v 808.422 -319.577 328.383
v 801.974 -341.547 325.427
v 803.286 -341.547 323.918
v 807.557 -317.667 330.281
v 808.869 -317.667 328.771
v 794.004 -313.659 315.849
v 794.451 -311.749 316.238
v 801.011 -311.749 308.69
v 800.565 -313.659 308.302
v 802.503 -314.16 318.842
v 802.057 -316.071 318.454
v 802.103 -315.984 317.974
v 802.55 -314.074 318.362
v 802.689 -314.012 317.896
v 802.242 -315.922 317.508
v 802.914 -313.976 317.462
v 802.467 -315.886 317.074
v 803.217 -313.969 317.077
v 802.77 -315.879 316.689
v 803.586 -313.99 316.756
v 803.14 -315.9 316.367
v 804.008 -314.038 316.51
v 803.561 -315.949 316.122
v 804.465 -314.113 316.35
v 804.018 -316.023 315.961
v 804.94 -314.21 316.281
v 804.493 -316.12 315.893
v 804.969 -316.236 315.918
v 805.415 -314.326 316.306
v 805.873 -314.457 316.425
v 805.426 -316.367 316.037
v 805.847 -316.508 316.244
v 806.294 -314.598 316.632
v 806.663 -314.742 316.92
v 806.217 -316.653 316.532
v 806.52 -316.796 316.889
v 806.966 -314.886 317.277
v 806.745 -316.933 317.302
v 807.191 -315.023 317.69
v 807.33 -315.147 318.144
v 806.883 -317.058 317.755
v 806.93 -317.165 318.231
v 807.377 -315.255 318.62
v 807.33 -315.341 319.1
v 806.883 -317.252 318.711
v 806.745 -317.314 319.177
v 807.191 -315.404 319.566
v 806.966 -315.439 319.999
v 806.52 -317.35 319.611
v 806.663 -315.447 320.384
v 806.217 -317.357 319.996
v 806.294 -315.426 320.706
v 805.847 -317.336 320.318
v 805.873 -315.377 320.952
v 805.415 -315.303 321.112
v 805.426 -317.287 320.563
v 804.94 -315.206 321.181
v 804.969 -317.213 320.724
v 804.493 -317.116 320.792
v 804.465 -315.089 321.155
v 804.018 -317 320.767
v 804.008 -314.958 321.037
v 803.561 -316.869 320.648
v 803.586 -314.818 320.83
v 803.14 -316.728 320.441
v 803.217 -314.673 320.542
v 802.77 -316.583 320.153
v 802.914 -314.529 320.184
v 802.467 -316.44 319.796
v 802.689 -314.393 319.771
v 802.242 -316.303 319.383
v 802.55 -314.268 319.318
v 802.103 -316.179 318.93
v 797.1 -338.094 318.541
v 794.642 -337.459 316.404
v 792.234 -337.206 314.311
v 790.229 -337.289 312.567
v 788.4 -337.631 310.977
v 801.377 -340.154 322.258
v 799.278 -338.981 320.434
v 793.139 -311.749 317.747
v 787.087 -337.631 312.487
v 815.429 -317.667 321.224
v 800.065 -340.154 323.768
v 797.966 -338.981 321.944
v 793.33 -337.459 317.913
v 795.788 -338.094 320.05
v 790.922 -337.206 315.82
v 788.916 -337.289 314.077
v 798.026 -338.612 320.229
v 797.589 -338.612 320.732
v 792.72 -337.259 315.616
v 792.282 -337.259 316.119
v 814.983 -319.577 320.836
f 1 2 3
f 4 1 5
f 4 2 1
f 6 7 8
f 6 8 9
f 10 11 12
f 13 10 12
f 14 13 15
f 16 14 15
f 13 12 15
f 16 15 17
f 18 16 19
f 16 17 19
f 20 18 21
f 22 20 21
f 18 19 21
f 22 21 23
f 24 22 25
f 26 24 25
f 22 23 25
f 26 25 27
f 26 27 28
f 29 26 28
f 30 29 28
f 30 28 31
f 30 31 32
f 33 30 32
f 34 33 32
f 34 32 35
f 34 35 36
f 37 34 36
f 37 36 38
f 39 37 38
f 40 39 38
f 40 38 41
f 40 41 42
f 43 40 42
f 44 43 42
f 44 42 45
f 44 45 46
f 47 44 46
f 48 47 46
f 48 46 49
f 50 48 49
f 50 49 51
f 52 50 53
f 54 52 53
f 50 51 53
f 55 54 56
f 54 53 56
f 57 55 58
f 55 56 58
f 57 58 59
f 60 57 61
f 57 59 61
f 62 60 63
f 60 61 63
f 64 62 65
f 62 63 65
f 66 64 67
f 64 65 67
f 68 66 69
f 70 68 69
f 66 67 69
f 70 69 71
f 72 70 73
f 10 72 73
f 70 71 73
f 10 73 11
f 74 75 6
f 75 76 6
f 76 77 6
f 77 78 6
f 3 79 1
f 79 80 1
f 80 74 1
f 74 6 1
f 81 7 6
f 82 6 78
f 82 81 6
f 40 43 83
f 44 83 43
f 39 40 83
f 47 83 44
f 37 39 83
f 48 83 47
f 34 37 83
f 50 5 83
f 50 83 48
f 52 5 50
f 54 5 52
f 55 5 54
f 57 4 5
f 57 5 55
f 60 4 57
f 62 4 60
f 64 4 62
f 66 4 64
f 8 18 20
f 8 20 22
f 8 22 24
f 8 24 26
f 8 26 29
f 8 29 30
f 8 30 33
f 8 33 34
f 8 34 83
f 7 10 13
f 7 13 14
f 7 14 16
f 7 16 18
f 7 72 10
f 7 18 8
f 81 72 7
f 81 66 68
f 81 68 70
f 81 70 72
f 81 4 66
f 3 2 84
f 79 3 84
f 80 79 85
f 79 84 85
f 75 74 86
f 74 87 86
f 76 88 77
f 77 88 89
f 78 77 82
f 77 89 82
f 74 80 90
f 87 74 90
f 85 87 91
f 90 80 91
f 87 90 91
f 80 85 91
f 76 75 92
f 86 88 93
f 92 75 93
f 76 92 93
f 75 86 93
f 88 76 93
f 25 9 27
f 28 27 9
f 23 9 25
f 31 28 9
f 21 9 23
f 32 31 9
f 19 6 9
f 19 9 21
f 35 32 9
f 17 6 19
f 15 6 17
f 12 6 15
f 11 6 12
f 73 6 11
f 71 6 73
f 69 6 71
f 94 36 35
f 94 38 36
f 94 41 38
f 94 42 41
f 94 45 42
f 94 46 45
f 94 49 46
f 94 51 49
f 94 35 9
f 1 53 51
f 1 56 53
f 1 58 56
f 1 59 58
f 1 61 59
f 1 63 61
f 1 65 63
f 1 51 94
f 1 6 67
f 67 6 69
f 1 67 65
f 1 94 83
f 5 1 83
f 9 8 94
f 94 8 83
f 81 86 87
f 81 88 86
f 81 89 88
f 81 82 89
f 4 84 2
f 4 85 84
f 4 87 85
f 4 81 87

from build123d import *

# Parameters (mm, degrees)
DODANIE_WYCI_GNI_CIE1_DEPTH       = 2
WYCI_GNI_CIE_CIENKA_CIANKA1_DEPTH = 10
SZKIC3_R                          = 2.5
WYTNIJ_WYCI_GNI_CIE1_DEPTH        = 6


with BuildPart() as part:
    # Szkic1 → Dodanie-wyciągnięcie1 (new body)
    with BuildSketch(Plane(origin=(184.050171811, 0, -211.725502995), x_dir=(-0.75470958, 0, -0.656059029), z_dir=(0.656059029, 0, -0.75470958))):
        with BuildLine():
            Line((-818.756651821, -341.547090535), (-826.154339771, -317.666675693))
            Line((-826.154339771, -317.666675693), (-807.050007897, -311.748525334))
            Line((-807.050007897, -311.748525334), (-799.03222594, -337.630660478))
            add(Edge.make_bspline(
                [(-818.756651821, -341.547090535), (-812.651532186, -337.74352209), (-805.362739321, -336.365866813), (-799.03222594, -337.630660478)],
                knots=[0.197302397, 0.197302397, 0.197302397, 0.197302397, 0.33815529, 0.33815529, 0.33815529, 0.33815529], degree=3, weights=[0.522216299, 0.482629046, 0.495947227, 0.562170841]))
        make_face()
    extrude(amount=DODANIE_WYCI_GNI_CIE1_DEPTH)

    # Szkic2 → Wyciągnięcie-cienka ścianka1 (add)
    with BuildSketch(Plane(origin=(185.362289869, 0, -213.234922155), x_dir=(-0.75470958, 0, -0.656059029), z_dir=(0.656059029, 0, -0.75470958))):
        Polygon((-826.154339771, -317.666675693), (-807.050007897, -311.748525334), (-806.458192861, -313.658958521), (-825.562524735, -319.577108881), align=None)
    extrude(amount=WYCI_GNI_CIE_CIENKA_CIANKA1_DEPTH)

    # Szkic3 → Wytnij-wyciągnięcie1 (cut)
    with BuildSketch(Plane(origin=(-13.617240057, -58.24452258, -11.837286187), x_dir=(-0.974744215, 0.218850254, 0.044477883), z_dir=(-0.223324239, -0.955216594, -0.194132799))):
        with Locations((-839.308044037, -375.023490092)):
            Circle(SZKIC3_R)
    extrude(amount=-WYTNIJ_WYCI_GNI_CIE1_DEPTH, mode=Mode.SUBTRACT)


solid = part.part
